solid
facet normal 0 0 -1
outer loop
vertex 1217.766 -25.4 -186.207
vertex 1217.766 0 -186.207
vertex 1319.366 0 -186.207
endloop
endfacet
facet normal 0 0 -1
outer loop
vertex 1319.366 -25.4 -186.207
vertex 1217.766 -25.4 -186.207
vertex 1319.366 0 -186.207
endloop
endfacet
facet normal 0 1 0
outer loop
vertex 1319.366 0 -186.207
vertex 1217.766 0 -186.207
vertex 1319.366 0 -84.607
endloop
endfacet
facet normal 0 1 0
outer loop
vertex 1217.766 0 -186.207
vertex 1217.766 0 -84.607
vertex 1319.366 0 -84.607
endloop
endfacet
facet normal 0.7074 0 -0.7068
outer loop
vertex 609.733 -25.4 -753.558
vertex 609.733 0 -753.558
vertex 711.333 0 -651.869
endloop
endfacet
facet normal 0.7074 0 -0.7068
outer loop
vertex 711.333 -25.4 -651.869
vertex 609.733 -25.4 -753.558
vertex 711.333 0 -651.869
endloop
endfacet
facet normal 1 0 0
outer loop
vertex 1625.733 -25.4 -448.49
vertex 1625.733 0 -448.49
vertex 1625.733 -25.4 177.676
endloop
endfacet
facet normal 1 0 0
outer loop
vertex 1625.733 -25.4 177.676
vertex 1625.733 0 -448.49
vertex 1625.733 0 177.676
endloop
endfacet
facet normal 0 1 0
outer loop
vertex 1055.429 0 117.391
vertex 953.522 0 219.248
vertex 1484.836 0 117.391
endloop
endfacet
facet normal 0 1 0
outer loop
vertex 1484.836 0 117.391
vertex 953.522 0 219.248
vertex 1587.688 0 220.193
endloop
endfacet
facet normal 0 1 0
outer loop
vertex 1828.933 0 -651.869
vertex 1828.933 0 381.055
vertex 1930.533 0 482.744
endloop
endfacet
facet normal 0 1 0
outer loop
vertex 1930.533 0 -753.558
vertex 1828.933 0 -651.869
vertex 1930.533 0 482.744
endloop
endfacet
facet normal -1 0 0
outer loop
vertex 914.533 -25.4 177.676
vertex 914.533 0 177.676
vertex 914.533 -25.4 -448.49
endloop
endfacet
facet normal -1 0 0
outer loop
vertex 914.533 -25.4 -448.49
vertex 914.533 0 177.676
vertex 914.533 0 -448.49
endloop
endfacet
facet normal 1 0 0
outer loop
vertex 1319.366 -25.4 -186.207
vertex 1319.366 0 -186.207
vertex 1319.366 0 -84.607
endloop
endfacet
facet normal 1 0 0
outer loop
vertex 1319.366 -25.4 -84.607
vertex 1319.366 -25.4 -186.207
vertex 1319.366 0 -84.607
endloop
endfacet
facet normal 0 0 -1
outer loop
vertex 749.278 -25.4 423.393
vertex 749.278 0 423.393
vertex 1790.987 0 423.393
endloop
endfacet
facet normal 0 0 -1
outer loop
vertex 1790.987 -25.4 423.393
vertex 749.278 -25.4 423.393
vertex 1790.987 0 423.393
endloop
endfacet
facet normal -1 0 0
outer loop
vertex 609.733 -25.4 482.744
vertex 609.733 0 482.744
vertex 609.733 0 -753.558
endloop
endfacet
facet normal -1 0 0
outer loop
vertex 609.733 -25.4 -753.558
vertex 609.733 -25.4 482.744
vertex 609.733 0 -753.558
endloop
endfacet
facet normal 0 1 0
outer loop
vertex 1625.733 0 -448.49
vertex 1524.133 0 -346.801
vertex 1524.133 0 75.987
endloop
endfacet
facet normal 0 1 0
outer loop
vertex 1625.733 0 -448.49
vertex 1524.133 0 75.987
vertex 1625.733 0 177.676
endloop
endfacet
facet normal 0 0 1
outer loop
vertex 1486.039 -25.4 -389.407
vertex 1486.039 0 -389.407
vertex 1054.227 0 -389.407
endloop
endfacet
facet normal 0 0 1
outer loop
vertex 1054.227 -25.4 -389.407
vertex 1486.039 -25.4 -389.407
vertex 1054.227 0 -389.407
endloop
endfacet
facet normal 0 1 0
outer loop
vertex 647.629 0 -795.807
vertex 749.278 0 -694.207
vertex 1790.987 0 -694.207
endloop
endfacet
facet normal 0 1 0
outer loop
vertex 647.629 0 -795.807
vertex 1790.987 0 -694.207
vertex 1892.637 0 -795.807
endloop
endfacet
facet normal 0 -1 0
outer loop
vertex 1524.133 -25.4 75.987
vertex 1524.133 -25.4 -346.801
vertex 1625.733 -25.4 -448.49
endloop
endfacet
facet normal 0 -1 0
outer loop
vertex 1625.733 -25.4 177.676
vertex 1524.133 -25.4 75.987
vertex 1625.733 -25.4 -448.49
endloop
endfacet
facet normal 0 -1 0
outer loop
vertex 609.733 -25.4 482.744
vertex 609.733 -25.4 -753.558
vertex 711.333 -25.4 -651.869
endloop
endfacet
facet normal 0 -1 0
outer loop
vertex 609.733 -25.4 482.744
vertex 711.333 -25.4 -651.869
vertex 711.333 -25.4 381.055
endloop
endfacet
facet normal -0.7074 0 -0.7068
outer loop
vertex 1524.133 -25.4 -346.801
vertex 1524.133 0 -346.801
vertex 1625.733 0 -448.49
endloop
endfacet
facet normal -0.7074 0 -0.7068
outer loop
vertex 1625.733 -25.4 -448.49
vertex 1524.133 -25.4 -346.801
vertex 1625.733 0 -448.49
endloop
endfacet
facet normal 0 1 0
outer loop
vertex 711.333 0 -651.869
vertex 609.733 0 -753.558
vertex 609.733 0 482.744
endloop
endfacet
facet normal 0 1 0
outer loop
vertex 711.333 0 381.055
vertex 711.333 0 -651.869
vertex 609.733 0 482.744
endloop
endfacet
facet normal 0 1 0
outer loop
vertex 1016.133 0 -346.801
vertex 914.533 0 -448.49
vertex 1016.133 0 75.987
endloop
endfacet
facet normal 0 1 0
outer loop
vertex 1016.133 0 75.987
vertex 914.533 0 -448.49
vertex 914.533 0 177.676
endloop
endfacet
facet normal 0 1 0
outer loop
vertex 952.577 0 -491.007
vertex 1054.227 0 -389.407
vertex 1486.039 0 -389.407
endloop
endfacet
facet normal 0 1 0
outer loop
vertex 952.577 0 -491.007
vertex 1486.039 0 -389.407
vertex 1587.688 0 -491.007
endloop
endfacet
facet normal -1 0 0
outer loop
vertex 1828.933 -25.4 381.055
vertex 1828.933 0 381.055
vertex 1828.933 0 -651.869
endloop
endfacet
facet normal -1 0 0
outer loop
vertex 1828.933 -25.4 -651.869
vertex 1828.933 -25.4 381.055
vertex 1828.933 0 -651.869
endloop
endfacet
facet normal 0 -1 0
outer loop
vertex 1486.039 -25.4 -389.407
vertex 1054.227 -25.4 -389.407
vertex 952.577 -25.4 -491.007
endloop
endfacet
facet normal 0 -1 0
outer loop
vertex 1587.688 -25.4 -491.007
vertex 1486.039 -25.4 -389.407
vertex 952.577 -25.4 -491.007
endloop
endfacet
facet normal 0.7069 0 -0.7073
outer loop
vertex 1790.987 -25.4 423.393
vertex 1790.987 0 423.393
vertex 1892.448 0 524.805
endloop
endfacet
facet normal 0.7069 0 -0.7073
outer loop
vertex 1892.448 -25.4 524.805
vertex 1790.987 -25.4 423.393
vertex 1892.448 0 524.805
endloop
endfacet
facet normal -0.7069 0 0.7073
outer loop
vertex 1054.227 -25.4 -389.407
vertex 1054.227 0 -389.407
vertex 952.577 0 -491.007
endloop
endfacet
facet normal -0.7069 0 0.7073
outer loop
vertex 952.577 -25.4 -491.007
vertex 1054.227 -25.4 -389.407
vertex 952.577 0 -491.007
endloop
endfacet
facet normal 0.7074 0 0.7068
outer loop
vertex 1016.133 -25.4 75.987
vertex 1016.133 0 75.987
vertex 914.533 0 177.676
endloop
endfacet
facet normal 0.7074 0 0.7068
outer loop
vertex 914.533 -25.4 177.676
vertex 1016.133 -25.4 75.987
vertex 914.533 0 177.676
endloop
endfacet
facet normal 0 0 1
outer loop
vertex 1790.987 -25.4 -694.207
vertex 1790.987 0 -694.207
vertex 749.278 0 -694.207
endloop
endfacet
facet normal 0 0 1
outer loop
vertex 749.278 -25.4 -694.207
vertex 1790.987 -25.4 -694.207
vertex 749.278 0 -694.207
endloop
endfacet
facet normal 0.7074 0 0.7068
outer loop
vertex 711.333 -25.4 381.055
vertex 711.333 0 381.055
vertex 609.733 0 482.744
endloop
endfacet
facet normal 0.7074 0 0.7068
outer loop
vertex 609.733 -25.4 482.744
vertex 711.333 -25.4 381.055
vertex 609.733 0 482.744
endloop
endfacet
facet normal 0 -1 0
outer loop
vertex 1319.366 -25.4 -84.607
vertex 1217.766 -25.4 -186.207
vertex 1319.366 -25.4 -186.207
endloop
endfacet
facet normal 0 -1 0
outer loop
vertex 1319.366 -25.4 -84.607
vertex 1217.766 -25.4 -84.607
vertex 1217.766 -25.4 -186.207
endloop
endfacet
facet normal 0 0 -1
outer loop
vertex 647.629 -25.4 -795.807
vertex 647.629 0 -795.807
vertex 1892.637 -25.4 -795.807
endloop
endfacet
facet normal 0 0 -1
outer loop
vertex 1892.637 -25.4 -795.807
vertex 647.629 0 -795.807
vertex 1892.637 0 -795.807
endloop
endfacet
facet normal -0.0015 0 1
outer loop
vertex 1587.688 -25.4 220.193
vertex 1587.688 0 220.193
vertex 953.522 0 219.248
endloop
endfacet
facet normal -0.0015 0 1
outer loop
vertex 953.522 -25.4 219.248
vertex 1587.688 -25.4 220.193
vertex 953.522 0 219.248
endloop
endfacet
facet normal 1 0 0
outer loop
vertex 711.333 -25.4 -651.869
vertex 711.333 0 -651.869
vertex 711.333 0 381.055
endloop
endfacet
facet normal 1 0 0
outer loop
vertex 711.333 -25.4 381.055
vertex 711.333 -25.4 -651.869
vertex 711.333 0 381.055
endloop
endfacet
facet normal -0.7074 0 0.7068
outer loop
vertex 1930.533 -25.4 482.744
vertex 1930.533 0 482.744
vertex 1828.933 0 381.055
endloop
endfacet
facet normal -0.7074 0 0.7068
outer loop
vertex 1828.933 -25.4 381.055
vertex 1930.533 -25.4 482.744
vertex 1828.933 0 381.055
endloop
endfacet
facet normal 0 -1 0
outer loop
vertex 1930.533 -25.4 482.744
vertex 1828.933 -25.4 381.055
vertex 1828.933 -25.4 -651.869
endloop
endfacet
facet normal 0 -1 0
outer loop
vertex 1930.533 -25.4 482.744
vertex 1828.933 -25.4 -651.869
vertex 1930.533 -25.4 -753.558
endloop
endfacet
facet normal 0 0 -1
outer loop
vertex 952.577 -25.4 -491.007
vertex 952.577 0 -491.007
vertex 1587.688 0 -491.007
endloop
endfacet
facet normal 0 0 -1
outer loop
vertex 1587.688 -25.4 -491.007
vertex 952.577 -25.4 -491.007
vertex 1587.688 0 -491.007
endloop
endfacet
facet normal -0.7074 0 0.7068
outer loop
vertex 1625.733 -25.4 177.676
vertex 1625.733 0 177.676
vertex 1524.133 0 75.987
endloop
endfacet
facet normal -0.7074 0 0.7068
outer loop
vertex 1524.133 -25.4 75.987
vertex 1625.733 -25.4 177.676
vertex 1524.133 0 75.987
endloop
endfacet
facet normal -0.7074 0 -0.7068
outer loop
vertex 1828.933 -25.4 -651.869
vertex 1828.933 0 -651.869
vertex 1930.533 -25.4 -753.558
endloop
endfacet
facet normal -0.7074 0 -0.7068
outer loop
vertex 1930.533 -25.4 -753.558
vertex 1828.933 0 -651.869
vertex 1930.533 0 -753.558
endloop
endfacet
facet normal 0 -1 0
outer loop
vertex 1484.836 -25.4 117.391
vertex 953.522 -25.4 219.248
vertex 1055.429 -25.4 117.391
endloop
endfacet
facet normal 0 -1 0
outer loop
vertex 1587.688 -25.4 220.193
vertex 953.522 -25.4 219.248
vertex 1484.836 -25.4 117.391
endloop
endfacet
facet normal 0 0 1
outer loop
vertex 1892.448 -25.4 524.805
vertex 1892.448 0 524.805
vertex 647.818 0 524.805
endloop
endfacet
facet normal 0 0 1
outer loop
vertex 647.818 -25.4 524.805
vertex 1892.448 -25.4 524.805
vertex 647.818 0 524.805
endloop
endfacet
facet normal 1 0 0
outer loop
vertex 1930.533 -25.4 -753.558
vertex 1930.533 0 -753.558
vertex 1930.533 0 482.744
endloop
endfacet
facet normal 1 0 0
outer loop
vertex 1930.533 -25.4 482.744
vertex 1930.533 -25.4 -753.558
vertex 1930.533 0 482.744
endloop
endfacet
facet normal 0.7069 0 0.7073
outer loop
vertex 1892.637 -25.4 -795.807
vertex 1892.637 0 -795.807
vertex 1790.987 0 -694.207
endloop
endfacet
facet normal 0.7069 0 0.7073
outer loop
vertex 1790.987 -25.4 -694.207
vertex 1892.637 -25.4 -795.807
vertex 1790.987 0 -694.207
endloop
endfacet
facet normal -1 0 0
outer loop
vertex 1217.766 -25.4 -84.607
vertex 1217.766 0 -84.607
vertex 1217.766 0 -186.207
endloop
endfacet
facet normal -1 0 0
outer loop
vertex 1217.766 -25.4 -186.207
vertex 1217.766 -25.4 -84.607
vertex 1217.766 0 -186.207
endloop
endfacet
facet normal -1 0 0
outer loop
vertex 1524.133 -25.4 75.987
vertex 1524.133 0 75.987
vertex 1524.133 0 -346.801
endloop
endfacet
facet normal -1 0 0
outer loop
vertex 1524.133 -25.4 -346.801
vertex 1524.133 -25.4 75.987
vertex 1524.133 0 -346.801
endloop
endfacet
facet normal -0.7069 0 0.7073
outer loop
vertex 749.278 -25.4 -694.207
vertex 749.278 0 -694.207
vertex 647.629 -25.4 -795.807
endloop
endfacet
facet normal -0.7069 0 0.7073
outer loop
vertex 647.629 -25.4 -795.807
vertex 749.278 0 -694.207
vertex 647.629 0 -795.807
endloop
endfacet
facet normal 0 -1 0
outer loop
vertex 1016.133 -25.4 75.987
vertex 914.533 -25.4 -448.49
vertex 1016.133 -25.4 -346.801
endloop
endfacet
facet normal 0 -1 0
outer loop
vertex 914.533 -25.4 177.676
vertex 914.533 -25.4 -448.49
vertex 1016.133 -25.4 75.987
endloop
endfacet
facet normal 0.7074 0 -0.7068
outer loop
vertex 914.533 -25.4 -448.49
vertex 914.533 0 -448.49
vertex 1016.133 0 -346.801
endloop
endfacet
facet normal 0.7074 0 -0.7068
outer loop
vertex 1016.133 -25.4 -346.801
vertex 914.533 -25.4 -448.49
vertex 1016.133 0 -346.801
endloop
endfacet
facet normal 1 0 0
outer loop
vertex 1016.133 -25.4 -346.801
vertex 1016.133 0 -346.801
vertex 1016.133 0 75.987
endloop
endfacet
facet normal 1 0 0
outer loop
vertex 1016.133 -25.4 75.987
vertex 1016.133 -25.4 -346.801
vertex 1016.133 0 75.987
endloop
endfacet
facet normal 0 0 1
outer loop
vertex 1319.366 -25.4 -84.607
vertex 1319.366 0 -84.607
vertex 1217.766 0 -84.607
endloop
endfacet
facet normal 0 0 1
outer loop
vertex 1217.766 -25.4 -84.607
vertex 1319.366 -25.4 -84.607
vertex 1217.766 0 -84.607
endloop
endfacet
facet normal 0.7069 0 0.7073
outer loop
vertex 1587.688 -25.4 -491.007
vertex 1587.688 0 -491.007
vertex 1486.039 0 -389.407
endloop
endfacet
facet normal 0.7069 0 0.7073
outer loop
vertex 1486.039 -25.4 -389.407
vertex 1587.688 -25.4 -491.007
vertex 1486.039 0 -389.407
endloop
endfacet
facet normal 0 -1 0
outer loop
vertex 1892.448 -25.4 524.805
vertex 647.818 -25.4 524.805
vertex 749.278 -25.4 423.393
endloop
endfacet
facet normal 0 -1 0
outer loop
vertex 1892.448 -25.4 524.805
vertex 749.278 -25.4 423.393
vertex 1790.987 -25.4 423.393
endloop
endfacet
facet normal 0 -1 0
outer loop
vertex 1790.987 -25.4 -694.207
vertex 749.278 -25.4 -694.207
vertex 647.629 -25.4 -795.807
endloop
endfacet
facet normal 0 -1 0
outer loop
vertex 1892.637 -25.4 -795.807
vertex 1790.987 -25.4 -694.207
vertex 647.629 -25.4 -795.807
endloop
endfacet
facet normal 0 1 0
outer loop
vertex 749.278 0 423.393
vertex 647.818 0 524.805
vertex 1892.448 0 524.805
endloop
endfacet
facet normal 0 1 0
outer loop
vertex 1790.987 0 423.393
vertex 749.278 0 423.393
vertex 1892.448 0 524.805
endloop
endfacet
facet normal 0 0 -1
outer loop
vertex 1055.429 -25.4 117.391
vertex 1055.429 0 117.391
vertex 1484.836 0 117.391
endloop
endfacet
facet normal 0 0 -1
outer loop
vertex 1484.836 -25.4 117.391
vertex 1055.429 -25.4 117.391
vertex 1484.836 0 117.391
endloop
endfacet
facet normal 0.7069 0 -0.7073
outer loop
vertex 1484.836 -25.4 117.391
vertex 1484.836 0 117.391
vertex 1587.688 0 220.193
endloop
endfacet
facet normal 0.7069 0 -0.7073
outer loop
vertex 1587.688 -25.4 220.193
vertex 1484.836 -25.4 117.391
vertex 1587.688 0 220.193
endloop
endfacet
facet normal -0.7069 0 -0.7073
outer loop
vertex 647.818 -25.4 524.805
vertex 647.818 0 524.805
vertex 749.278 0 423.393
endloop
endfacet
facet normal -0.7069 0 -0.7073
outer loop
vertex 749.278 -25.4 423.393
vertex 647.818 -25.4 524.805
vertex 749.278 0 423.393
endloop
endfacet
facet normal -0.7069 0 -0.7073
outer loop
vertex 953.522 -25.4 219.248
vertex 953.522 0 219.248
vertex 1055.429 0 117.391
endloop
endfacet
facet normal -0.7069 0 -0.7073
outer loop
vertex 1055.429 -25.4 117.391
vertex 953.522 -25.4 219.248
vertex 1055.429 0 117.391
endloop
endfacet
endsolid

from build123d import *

# Parameters (mm, degrees)
F1_DEPTH = 25.4


with BuildPart() as f1:
    # F0 (on Front) → F1 (new body)
    with BuildSketch(Plane.XZ):
        Polygon((1217.7658302538, -186.2069594315), (1319.3658302538, -186.2069594315), (1319.3658302538, -84.6069594315), (1268.5658302538, -84.6069594315), (1268.5658302538, -135.4069594315), (1217.7658302538, -135.4069594315), align=None)
        Polygon((1268.5658302538, -84.6069594315), (1217.7658302538, -84.6069594315), (1217.7658302538, -84.6383770839), (1217.7658302538, -135.4069594315), (1268.5658302538, -135.4069594315), align=None)
    extrude(amount=F1_DEPTH)


with BuildPart() as f1b:
    # F0 (on Front) → F1, piece 2 (new body)
    with BuildSketch(Plane.XZ):
        Polygon((953.5223343681, 219.2484295396), (1055.429416395, 117.3908703306), (1484.8362563349, 117.3908703306), (1587.6884086575, 220.1930405685), align=None)
    extrude(amount=F1_DEPTH)


with BuildPart() as f1c:
    # F0 (on Front) → F1, piece 3 (new body)
    with BuildSketch(Plane.XZ):
        Polygon((1016.132836365, 63.2760249292), (1016.132836365, 75.9871864359), (914.532836365, 177.6764784897), (914.532836365, 169.5246078354), (914.532836365, -135.4069594315), (914.532836365, -448.4903973526), (1016.132836365, -346.8011052989), (1016.132836365, -135.4069594315), align=None)
    extrude(amount=F1_DEPTH)


with BuildPart() as f1d:
    # F0 (on Front) → F1, piece 4 (new body)
    with BuildSketch(Plane.XZ):
        Polygon((647.8175146307, 524.8046888061), (749.2784688856, 423.3930405685), (753.6708143363, 423.3930405685), (1270.132836365, 423.3930405685), (1786.5948583937, 423.3930405685), (1790.9872038444, 423.3930405685), (1892.4481580993, 524.8046888061), align=None)
    extrude(amount=F1_DEPTH)


with BuildPart() as f1e:
    # F0 (on Front) → F1, piece 5 (new body)
    with BuildSketch(Plane.XZ):
        Polygon((1625.732836365, 177.6764784897), (1524.132836365, 75.9871864359), (1524.132836365, -135.4069594315), (1524.132836365, -346.8011052989), (1625.732836365, -448.4903973526), (1625.732836365, -135.4069594315), align=None)
    extrude(amount=F1_DEPTH)


with BuildPart() as f1f:
    # F0 (on Front) → F1, piece 6 (new body)
    with BuildSketch(Plane.XZ):
        Polygon((1058.7386904976, -389.4069594315), (1054.2266616658, -389.4069594315), (952.5772640724, -491.0069594315), (1270.132836365, -491.0069594315), (1587.6884086575, -491.0069594315), (1486.0390110641, -389.4069594315), (1481.5269822323, -389.4069594315), (1270.132836365, -389.4069594315), align=None)
    extrude(amount=F1_DEPTH)


with BuildPart() as f1g:
    # F0 (on Front) → F1, piece 7 (new body)
    with BuildSketch(Plane.XZ):
        Polygon((711.332836365, 368.3439010905), (711.332836365, 381.0550625972), (609.732836365, 482.744354651), (609.732836365, -135.4069594315), (609.732836365, -753.558273514), (711.332836365, -651.8689814602), (711.332836365, -135.4069594315), align=None)
    extrude(amount=F1_DEPTH)


with BuildPart() as f1h:
    # F0 (on Front) → F1, piece 8 (new body)
    with BuildSketch(Plane.XZ):
        Polygon((1930.532836365, 482.744354651), (1828.932836365, 381.0550625972), (1828.932836365, -135.4069594315), (1828.932836365, -651.8689814602), (1930.532836365, -753.558273514), (1930.532836365, -135.4069594315), align=None)
    extrude(amount=F1_DEPTH)


with BuildPart() as f1i:
    # F0 (on Front) → F1, piece 9 (new body)
    with BuildSketch(Plane.XZ):
        Polygon((753.6708143363, -694.2069594315), (749.2784688856, -694.2069594315), (647.6290712922, -795.8069594315), (1270.132836365, -795.8069594315), (1892.6366014378, -795.8069594315), (1790.9872038443, -694.2069594315), (1786.5948583937, -694.2069594315), (1270.132836365, -694.2069594315), align=None)
    extrude(amount=F1_DEPTH)


solid = Compound([f1.part, f1b.part, f1c.part, f1d.part, f1e.part, f1f.part, f1g.part, f1h.part, f1i.part])
